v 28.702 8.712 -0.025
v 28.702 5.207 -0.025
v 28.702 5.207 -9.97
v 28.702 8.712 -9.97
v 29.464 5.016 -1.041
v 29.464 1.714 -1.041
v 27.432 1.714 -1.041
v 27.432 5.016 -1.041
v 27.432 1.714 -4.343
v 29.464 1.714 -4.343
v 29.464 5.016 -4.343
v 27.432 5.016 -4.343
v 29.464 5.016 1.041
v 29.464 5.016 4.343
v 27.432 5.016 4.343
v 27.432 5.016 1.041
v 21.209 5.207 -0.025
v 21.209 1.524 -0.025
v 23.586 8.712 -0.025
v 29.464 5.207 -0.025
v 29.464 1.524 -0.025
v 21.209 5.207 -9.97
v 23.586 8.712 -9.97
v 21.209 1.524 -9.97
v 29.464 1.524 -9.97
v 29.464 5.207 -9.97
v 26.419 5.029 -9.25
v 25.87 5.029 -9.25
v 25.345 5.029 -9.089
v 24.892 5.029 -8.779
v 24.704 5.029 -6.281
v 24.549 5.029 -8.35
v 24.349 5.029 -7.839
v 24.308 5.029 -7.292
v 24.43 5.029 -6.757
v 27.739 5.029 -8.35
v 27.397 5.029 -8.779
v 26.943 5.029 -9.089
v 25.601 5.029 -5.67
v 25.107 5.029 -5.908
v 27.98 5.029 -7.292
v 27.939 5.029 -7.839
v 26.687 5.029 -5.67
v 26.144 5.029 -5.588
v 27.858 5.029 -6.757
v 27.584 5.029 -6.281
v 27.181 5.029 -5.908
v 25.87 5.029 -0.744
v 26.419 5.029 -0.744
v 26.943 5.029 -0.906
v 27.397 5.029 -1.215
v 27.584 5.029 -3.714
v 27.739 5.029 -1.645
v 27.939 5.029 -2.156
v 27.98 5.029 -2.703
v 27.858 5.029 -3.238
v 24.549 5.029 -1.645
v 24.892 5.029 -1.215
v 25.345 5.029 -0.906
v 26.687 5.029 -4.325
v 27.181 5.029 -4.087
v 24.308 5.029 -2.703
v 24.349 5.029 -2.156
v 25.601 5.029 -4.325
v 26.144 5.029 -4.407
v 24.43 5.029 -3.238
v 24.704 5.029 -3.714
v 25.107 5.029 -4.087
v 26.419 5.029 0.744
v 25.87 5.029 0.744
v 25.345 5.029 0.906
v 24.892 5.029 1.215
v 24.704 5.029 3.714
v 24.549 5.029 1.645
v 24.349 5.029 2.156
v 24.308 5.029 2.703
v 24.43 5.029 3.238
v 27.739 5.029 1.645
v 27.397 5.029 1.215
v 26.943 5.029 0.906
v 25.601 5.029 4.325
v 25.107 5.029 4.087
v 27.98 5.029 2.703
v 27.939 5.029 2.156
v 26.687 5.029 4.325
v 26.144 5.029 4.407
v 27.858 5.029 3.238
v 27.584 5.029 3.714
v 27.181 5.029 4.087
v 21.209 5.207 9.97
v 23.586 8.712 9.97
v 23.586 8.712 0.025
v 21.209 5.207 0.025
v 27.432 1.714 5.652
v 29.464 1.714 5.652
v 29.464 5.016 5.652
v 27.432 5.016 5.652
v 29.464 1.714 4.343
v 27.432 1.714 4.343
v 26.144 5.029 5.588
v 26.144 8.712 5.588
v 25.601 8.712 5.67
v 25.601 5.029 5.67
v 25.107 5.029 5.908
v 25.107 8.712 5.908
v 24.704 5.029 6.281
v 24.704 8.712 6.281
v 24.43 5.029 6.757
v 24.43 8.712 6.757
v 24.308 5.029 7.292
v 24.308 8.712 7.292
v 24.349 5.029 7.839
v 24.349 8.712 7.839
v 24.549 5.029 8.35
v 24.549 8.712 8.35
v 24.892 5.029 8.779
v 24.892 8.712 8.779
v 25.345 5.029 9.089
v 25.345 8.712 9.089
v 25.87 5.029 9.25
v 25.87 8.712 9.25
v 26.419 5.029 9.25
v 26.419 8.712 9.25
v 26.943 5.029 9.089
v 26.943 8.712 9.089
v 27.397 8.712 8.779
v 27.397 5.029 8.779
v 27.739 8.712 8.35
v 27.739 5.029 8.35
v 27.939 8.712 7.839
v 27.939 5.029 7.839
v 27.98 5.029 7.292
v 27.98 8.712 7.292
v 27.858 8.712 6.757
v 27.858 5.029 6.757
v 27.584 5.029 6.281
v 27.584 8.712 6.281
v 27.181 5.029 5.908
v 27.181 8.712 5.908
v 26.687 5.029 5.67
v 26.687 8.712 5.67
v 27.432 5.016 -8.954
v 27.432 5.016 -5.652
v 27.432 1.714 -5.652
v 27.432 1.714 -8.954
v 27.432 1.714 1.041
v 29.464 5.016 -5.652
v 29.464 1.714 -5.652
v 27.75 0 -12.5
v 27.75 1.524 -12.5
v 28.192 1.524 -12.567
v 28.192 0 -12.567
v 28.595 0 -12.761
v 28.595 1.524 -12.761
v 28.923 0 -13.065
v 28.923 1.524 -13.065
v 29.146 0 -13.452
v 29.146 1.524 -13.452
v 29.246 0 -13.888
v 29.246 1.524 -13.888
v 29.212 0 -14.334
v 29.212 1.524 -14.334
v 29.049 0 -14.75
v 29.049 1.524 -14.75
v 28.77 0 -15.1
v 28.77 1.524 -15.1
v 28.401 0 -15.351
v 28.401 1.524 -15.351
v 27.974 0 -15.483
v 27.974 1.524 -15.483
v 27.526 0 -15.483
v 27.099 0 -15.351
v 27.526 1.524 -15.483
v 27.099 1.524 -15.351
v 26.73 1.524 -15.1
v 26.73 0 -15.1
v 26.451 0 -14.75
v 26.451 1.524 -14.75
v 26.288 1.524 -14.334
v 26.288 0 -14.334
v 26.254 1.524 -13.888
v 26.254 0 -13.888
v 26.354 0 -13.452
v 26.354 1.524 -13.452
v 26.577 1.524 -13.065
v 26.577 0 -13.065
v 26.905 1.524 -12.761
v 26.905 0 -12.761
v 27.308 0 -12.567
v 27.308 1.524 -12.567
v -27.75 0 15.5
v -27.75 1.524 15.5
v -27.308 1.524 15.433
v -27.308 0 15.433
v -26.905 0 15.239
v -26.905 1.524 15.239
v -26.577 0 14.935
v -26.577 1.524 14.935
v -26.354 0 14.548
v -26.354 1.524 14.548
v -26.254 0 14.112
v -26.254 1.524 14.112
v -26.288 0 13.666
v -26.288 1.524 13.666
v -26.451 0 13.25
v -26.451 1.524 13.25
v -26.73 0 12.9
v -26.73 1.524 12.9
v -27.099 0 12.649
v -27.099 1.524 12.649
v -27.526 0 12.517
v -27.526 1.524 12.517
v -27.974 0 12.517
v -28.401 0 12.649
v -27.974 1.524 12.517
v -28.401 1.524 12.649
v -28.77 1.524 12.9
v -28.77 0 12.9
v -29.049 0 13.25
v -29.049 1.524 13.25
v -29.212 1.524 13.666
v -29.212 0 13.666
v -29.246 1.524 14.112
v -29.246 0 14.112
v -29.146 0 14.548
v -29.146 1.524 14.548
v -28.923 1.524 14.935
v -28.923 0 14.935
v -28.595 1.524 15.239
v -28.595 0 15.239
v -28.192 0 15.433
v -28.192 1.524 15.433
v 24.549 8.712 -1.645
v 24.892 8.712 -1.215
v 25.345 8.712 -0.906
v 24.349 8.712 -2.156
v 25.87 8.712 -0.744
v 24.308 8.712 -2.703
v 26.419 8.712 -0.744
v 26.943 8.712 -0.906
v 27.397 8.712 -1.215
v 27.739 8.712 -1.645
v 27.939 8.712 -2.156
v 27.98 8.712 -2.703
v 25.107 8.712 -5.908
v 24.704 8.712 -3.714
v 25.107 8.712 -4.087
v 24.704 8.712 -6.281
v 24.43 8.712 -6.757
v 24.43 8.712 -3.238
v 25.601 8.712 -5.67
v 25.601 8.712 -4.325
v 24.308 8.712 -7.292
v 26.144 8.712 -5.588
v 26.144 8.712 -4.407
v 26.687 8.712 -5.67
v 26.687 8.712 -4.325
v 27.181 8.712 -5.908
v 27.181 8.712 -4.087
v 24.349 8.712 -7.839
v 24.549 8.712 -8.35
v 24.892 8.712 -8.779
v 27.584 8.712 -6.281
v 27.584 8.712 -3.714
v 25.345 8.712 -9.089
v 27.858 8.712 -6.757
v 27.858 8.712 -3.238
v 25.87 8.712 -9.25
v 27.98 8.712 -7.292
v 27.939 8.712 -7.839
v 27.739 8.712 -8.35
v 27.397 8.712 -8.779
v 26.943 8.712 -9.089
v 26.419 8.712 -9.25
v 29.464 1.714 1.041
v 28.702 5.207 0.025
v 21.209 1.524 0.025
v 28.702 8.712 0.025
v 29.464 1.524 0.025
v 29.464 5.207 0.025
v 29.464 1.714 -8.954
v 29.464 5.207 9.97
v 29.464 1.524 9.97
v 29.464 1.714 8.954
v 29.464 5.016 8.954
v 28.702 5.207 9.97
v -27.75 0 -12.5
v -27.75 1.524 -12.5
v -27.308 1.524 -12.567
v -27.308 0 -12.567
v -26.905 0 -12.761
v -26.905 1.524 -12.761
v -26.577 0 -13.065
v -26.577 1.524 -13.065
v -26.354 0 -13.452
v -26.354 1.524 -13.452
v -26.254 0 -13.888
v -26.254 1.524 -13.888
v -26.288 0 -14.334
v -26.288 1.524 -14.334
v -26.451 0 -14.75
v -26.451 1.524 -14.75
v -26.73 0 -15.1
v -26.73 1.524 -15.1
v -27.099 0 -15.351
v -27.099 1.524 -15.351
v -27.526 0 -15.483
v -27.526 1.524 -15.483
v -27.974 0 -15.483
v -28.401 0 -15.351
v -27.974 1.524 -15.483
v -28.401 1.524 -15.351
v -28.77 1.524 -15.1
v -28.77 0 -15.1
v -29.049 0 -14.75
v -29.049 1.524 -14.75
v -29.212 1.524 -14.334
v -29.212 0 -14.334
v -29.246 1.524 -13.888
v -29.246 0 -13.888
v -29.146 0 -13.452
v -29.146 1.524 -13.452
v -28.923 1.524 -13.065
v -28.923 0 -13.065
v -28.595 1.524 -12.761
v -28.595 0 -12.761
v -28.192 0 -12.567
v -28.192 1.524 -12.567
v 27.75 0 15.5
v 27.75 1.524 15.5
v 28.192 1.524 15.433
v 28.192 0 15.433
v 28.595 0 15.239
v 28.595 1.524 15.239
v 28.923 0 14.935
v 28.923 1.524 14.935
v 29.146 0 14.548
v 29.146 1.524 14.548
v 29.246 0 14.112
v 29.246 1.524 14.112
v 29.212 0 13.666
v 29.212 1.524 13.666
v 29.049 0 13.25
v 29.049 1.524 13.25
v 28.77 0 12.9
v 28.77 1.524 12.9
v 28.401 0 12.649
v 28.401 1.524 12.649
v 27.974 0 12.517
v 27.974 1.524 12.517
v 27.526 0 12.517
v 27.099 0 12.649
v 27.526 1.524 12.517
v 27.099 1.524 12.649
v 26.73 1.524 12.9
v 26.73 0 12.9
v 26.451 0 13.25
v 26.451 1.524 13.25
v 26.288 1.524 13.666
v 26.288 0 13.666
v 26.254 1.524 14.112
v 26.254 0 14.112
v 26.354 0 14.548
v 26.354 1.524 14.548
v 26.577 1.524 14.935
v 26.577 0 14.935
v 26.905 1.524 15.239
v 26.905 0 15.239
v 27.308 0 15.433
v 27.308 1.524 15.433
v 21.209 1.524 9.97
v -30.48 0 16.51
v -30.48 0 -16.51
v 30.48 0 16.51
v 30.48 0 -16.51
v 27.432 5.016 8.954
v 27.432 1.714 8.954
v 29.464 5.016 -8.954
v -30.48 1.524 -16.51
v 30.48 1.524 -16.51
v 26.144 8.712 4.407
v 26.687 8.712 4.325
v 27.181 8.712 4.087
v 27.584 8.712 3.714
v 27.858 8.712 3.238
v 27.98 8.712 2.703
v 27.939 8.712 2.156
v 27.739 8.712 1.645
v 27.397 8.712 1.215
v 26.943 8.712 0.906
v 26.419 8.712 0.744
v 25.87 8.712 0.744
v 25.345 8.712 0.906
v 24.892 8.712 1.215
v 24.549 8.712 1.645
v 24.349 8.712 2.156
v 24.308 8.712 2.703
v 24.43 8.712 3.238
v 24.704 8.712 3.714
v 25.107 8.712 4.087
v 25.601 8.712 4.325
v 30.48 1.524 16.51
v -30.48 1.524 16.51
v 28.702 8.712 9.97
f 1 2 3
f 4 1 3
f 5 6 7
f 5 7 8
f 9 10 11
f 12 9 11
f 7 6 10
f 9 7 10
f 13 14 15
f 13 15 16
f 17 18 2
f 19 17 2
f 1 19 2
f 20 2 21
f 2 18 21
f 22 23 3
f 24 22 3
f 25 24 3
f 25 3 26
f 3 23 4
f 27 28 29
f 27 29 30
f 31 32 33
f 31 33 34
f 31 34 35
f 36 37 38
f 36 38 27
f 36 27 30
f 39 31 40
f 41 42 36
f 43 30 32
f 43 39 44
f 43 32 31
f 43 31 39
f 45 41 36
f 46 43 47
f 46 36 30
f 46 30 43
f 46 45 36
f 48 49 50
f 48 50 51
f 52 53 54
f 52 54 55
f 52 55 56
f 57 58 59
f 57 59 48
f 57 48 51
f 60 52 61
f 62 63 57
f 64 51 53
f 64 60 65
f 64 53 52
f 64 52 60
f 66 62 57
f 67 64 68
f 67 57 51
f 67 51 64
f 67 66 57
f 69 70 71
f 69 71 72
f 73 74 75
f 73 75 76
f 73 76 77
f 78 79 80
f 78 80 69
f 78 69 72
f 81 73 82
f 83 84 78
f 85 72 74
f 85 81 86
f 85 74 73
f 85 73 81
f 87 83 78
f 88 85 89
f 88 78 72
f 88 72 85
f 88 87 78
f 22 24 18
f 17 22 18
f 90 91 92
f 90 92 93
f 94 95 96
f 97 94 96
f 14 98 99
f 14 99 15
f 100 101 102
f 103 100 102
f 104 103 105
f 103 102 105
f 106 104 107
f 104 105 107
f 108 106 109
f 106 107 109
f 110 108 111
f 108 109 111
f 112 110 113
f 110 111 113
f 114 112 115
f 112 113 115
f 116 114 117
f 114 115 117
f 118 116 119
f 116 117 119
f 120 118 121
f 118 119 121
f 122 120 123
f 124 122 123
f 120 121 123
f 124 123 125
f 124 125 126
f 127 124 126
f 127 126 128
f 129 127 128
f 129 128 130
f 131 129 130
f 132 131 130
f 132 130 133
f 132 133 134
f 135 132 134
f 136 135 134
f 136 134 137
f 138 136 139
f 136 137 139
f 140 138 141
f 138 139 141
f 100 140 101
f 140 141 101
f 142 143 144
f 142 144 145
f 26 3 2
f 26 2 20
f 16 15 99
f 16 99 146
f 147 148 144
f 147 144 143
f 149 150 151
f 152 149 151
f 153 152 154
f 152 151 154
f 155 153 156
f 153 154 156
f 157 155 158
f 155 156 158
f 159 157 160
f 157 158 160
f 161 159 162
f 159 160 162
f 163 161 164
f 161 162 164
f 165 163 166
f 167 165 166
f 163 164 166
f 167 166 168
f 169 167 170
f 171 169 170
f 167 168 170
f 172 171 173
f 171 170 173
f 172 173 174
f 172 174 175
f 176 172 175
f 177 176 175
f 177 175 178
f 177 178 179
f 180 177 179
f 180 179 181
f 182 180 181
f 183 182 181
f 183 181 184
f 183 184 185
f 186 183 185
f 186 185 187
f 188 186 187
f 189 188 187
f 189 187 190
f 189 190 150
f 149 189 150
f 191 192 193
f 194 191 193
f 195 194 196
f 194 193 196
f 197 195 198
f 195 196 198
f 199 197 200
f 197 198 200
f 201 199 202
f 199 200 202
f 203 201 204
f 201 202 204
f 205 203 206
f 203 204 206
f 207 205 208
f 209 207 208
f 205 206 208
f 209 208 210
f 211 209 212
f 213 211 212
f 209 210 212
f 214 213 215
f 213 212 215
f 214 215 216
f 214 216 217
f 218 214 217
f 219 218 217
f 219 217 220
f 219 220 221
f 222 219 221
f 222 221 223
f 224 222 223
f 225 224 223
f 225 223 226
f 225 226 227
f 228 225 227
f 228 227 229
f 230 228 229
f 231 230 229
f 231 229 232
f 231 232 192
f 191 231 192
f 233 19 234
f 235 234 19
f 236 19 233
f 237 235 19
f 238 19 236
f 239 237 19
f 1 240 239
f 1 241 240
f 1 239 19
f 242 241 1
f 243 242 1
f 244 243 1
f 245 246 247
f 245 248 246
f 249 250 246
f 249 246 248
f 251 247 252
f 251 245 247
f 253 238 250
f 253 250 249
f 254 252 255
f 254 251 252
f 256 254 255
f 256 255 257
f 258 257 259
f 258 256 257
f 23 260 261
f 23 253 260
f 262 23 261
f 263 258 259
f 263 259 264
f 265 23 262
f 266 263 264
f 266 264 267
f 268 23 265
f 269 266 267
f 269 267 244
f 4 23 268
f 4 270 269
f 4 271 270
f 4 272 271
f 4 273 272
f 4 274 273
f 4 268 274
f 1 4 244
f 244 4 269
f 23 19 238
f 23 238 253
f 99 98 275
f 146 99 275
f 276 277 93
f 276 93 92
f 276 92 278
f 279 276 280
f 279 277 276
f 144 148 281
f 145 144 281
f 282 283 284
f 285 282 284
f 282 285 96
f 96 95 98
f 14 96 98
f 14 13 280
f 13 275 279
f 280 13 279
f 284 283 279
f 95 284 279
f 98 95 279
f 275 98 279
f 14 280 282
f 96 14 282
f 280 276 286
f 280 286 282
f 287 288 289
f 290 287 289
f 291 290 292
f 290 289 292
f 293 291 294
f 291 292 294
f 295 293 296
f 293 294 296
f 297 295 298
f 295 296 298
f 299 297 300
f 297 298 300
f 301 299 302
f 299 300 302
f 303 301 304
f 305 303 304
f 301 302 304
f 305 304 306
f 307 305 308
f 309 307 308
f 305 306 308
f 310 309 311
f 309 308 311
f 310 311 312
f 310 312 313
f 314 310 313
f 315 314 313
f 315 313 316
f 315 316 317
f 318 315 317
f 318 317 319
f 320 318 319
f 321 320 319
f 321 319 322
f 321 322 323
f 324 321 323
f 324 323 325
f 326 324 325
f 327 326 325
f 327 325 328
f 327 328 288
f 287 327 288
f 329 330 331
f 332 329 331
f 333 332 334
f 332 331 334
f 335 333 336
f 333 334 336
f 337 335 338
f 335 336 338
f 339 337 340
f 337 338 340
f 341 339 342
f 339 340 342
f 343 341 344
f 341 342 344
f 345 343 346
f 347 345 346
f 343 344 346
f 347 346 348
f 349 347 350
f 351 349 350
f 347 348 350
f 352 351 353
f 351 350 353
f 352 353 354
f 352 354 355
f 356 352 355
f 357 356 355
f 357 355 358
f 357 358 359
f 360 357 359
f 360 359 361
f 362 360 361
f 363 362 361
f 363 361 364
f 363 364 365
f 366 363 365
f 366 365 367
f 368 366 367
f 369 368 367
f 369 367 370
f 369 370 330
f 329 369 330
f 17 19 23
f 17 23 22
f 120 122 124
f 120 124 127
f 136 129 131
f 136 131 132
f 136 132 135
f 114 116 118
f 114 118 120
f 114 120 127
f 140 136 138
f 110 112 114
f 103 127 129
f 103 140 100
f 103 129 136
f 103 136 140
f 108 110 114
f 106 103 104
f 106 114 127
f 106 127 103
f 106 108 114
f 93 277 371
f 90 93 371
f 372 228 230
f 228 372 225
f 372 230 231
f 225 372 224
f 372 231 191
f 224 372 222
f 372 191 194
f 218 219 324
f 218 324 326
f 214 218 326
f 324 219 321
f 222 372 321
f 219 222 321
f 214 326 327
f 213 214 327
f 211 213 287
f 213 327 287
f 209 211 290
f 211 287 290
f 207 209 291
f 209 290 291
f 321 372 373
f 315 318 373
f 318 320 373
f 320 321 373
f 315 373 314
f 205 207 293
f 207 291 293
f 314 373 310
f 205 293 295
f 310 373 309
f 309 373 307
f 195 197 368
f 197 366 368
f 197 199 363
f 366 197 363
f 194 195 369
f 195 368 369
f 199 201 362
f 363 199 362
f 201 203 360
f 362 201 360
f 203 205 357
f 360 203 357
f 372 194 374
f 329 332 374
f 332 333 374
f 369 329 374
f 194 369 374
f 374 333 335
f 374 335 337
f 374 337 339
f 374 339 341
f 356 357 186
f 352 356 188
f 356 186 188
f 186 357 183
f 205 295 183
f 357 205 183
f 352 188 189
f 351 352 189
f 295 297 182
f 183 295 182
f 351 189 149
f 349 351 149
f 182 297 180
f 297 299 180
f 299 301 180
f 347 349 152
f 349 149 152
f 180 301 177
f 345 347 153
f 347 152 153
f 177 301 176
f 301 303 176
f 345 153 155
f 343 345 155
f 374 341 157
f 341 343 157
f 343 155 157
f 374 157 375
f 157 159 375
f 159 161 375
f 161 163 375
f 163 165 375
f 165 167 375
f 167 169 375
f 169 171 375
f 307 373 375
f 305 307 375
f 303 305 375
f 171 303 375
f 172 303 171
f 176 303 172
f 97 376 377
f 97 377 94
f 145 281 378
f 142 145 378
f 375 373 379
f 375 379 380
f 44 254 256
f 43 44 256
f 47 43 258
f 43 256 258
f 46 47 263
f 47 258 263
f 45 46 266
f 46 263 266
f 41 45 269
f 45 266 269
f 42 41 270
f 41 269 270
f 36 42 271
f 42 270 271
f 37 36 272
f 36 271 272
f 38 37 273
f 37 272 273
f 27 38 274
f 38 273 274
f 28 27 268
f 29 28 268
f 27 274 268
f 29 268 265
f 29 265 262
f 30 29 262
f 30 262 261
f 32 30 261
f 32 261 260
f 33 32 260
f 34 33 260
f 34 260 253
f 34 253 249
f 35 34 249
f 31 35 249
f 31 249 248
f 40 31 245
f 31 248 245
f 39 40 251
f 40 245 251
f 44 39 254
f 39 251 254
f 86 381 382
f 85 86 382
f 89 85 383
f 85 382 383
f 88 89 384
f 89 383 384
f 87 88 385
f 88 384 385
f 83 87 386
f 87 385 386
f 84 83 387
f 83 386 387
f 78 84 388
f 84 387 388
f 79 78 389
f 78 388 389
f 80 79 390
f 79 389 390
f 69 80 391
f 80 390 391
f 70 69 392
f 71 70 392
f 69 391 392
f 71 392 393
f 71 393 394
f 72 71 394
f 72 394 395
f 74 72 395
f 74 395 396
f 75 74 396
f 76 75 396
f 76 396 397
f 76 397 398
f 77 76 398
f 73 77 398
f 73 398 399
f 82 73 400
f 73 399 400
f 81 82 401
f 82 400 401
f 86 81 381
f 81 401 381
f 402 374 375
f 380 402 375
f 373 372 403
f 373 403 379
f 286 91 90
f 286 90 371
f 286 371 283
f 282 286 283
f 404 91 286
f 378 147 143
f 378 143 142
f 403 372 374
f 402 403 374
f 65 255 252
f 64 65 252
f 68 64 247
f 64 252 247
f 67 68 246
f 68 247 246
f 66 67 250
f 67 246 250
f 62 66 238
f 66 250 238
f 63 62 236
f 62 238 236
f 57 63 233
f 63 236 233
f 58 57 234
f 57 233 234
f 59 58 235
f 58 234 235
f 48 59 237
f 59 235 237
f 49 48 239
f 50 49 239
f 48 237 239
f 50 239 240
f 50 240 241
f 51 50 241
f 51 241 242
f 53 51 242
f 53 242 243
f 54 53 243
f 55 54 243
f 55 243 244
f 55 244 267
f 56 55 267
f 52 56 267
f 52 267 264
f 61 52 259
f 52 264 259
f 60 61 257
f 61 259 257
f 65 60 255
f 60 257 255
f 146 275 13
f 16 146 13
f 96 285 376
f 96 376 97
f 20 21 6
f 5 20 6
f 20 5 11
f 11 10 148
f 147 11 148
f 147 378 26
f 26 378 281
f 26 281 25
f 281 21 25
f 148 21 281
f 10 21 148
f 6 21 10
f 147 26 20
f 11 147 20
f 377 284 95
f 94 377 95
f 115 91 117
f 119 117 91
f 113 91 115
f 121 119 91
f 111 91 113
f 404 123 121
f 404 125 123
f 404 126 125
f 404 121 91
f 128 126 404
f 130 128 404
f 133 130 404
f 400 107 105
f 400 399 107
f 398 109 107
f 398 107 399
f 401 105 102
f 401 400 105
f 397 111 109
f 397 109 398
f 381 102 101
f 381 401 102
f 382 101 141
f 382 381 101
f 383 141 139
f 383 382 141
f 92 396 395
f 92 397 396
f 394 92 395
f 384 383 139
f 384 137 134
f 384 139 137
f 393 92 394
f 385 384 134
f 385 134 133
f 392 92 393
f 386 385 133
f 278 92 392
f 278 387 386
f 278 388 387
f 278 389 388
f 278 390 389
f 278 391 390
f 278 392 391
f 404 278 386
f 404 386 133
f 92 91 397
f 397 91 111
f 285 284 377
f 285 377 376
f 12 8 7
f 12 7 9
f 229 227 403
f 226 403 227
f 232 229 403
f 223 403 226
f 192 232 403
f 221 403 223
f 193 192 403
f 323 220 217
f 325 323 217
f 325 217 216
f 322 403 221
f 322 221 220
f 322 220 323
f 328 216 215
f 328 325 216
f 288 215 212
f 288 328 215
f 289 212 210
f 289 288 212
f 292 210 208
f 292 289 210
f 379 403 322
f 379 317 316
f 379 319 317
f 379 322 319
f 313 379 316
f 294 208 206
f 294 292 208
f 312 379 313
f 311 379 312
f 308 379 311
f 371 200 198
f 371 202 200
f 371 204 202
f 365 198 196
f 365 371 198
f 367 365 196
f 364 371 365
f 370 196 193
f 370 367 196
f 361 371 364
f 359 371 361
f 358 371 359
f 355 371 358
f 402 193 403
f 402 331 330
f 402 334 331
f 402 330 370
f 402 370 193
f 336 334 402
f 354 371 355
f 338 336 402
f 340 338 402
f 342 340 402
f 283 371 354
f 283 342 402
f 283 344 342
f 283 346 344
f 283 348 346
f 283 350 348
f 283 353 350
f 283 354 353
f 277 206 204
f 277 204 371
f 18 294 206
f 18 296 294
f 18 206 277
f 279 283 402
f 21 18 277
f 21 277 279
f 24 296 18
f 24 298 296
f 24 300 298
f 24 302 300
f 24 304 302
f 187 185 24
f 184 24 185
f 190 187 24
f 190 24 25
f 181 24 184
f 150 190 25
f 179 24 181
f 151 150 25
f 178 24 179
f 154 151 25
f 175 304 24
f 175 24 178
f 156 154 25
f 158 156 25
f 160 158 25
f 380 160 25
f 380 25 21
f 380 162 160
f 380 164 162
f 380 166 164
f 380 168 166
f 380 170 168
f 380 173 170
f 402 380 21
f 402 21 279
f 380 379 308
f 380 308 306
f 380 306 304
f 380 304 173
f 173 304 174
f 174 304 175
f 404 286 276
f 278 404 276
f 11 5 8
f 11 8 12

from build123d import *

# Parameters (mm, degrees)
ESQUISSE1_W             = 60.96
ESQUISSE1_H             = 33.02
BOSS_EXTRU_1_DEPTH      = 1.524
ESQUISSE3_W             = 8.255
ESQUISSE3_H             = 9.9695
BOSS_EXTRU_2_DEPTH      = 3.683
BOSS_EXTRU_3_DEPTH      = 3.5052
BOSS_EXTRU_4_DEPTH      = 19.939
ENL_V_START             = -7.1882
ESQUISSE7_W             = 8.255
ESQUISSE7_H             = 0.0508
ENL_V_MAT_EXTRU_1_DEPTH = 7.1882
ESQUISSE8_W             = 3.302
ESQUISSE8_H             = 3.302
ENL_V_MAT_EXTRU_2_DEPTH = 2.032
ESQUISSE9_R             = 1.8415
ENL_V_MAT_EXTRU_3_DEPTH = 3.683
ESQUISSE10_R            = 1.5
ENL_V_MAT_EXTRU_4_DEPTH = 36.401705033


with BuildPart() as part:
    # Esquisse1 → Boss.-Extru.1 (new body)
    with BuildSketch(Plane(origin=(0, 0, 0), x_dir=(1, 0, 0), z_dir=(0, 1, 0))):
        Rectangle(ESQUISSE1_W, ESQUISSE1_H)
    extrude(amount=BOSS_EXTRU_1_DEPTH)

    # Esquisse3 → Boss.-Extru.2 (add)
    with BuildSketch(Plane(origin=(0, 1.524, 0), x_dir=(1, 0, 0), z_dir=(0, 1, 0))):
        with Locations((25.3365, -4.98475)):
            Rectangle(ESQUISSE3_W, ESQUISSE3_H)
        with Locations((25.3365, 4.98475)):
            Rectangle(ESQUISSE3_W, ESQUISSE3_H)
    extrude(amount=BOSS_EXTRU_2_DEPTH)

    # Esquisse5 → Boss.-Extru.3 (add)
    with BuildSketch(Plane(origin=(0, 5.207, 0), x_dir=(1, 0, 0), z_dir=(0, 1, 0))):
        Polygon((28.702, 0), (28.702, 9.9695), (23.586152916, 9.9695), (23.586152916, -9.9695), (28.702, -9.9695), align=None)
    extrude(amount=BOSS_EXTRU_3_DEPTH)

    # Esquisse6 → Boss.-Extru.4 (add)
    with BuildSketch(Plane.XY.offset(9.9695)):
        Polygon((23.586152916, 8.7122), (21.209, 5.207), (23.586152916, 5.207), align=None)
    extrude(amount=-BOSS_EXTRU_4_DEPTH)

    # Esquisse7 → Enlèv. mat.-Extru.1 (cut)
    with BuildSketch(Plane(origin=(0, 8.7122, 0), x_dir=(1, 0, 0), z_dir=(0, 1, 0)).offset(ENL_V_START)):
        with Locations((25.3365, 0)):
            Rectangle(ESQUISSE7_W, ESQUISSE7_H)
    extrude(amount=ENL_V_MAT_EXTRU_1_DEPTH, mode=Mode.SUBTRACT)

    # Esquisse8 → Enlèv. mat.-Extru.2 (cut)
    with BuildSketch(Plane(origin=(29.464, 0, 0), x_dir=(0, 0, -1), z_dir=(1, 0, 0))):
        with Locations((7.3025, 3.3655)):
            Rectangle(ESQUISSE8_W, ESQUISSE8_H)
        with Locations((2.6924, 3.3655)):
            Rectangle(ESQUISSE8_W, ESQUISSE8_H)
        with Locations((-7.3025, 3.3655)):
            Rectangle(ESQUISSE8_W, ESQUISSE8_H)
        with Locations((-2.6924, 3.3655)):
            Rectangle(ESQUISSE8_W, ESQUISSE8_H)
    extrude(amount=-ENL_V_MAT_EXTRU_2_DEPTH, mode=Mode.SUBTRACT)

    # Esquisse9 → Enlèv. mat.-Extru.3 (cut)
    with BuildSketch(Plane(origin=(0, 8.7122, 0), x_dir=(1, 0, 0), z_dir=(0, 1, 0))):
        with Locations(Location((26.144076458, 7.4295, 0), (0, 0, 270))):
            Circle(ESQUISSE9_R)
        with Locations(Location((26.144076458, 2.5654, 0), (0, 0, 90))):
            Circle(ESQUISSE9_R)
        with Locations(Location((26.144076458, -2.5654, 0), (0, 0, 270))):
            Circle(ESQUISSE9_R)
        with Locations(Location((26.144076458, -7.4295, 0), (0, 0, 90))):
            Circle(ESQUISSE9_R)
    extrude(amount=-ENL_V_MAT_EXTRU_3_DEPTH, mode=Mode.SUBTRACT)

    # Esquisse10 → Enlèv. mat.-Extru.4 (cut, through all)
    with BuildSketch(Plane(origin=(0, 1.524, 0), x_dir=(1, 0, 0), z_dir=(0, 1, 0))):
        with Locations(Location((-27.75, 14, 0), (0, 0, 270))):
            Circle(ESQUISSE10_R)
        with Locations(Location((27.75, 14, 0), (0, 0, 270))):
            Circle(ESQUISSE10_R)
        with Locations(Location((27.75, -14, 0), (0, 0, 270))):
            Circle(ESQUISSE10_R)
        with Locations(Location((-27.75, -14, 0), (0, 0, 270))):
            Circle(ESQUISSE10_R)
    extrude(amount=-ENL_V_MAT_EXTRU_4_DEPTH, mode=Mode.SUBTRACT)


solid = part.part
